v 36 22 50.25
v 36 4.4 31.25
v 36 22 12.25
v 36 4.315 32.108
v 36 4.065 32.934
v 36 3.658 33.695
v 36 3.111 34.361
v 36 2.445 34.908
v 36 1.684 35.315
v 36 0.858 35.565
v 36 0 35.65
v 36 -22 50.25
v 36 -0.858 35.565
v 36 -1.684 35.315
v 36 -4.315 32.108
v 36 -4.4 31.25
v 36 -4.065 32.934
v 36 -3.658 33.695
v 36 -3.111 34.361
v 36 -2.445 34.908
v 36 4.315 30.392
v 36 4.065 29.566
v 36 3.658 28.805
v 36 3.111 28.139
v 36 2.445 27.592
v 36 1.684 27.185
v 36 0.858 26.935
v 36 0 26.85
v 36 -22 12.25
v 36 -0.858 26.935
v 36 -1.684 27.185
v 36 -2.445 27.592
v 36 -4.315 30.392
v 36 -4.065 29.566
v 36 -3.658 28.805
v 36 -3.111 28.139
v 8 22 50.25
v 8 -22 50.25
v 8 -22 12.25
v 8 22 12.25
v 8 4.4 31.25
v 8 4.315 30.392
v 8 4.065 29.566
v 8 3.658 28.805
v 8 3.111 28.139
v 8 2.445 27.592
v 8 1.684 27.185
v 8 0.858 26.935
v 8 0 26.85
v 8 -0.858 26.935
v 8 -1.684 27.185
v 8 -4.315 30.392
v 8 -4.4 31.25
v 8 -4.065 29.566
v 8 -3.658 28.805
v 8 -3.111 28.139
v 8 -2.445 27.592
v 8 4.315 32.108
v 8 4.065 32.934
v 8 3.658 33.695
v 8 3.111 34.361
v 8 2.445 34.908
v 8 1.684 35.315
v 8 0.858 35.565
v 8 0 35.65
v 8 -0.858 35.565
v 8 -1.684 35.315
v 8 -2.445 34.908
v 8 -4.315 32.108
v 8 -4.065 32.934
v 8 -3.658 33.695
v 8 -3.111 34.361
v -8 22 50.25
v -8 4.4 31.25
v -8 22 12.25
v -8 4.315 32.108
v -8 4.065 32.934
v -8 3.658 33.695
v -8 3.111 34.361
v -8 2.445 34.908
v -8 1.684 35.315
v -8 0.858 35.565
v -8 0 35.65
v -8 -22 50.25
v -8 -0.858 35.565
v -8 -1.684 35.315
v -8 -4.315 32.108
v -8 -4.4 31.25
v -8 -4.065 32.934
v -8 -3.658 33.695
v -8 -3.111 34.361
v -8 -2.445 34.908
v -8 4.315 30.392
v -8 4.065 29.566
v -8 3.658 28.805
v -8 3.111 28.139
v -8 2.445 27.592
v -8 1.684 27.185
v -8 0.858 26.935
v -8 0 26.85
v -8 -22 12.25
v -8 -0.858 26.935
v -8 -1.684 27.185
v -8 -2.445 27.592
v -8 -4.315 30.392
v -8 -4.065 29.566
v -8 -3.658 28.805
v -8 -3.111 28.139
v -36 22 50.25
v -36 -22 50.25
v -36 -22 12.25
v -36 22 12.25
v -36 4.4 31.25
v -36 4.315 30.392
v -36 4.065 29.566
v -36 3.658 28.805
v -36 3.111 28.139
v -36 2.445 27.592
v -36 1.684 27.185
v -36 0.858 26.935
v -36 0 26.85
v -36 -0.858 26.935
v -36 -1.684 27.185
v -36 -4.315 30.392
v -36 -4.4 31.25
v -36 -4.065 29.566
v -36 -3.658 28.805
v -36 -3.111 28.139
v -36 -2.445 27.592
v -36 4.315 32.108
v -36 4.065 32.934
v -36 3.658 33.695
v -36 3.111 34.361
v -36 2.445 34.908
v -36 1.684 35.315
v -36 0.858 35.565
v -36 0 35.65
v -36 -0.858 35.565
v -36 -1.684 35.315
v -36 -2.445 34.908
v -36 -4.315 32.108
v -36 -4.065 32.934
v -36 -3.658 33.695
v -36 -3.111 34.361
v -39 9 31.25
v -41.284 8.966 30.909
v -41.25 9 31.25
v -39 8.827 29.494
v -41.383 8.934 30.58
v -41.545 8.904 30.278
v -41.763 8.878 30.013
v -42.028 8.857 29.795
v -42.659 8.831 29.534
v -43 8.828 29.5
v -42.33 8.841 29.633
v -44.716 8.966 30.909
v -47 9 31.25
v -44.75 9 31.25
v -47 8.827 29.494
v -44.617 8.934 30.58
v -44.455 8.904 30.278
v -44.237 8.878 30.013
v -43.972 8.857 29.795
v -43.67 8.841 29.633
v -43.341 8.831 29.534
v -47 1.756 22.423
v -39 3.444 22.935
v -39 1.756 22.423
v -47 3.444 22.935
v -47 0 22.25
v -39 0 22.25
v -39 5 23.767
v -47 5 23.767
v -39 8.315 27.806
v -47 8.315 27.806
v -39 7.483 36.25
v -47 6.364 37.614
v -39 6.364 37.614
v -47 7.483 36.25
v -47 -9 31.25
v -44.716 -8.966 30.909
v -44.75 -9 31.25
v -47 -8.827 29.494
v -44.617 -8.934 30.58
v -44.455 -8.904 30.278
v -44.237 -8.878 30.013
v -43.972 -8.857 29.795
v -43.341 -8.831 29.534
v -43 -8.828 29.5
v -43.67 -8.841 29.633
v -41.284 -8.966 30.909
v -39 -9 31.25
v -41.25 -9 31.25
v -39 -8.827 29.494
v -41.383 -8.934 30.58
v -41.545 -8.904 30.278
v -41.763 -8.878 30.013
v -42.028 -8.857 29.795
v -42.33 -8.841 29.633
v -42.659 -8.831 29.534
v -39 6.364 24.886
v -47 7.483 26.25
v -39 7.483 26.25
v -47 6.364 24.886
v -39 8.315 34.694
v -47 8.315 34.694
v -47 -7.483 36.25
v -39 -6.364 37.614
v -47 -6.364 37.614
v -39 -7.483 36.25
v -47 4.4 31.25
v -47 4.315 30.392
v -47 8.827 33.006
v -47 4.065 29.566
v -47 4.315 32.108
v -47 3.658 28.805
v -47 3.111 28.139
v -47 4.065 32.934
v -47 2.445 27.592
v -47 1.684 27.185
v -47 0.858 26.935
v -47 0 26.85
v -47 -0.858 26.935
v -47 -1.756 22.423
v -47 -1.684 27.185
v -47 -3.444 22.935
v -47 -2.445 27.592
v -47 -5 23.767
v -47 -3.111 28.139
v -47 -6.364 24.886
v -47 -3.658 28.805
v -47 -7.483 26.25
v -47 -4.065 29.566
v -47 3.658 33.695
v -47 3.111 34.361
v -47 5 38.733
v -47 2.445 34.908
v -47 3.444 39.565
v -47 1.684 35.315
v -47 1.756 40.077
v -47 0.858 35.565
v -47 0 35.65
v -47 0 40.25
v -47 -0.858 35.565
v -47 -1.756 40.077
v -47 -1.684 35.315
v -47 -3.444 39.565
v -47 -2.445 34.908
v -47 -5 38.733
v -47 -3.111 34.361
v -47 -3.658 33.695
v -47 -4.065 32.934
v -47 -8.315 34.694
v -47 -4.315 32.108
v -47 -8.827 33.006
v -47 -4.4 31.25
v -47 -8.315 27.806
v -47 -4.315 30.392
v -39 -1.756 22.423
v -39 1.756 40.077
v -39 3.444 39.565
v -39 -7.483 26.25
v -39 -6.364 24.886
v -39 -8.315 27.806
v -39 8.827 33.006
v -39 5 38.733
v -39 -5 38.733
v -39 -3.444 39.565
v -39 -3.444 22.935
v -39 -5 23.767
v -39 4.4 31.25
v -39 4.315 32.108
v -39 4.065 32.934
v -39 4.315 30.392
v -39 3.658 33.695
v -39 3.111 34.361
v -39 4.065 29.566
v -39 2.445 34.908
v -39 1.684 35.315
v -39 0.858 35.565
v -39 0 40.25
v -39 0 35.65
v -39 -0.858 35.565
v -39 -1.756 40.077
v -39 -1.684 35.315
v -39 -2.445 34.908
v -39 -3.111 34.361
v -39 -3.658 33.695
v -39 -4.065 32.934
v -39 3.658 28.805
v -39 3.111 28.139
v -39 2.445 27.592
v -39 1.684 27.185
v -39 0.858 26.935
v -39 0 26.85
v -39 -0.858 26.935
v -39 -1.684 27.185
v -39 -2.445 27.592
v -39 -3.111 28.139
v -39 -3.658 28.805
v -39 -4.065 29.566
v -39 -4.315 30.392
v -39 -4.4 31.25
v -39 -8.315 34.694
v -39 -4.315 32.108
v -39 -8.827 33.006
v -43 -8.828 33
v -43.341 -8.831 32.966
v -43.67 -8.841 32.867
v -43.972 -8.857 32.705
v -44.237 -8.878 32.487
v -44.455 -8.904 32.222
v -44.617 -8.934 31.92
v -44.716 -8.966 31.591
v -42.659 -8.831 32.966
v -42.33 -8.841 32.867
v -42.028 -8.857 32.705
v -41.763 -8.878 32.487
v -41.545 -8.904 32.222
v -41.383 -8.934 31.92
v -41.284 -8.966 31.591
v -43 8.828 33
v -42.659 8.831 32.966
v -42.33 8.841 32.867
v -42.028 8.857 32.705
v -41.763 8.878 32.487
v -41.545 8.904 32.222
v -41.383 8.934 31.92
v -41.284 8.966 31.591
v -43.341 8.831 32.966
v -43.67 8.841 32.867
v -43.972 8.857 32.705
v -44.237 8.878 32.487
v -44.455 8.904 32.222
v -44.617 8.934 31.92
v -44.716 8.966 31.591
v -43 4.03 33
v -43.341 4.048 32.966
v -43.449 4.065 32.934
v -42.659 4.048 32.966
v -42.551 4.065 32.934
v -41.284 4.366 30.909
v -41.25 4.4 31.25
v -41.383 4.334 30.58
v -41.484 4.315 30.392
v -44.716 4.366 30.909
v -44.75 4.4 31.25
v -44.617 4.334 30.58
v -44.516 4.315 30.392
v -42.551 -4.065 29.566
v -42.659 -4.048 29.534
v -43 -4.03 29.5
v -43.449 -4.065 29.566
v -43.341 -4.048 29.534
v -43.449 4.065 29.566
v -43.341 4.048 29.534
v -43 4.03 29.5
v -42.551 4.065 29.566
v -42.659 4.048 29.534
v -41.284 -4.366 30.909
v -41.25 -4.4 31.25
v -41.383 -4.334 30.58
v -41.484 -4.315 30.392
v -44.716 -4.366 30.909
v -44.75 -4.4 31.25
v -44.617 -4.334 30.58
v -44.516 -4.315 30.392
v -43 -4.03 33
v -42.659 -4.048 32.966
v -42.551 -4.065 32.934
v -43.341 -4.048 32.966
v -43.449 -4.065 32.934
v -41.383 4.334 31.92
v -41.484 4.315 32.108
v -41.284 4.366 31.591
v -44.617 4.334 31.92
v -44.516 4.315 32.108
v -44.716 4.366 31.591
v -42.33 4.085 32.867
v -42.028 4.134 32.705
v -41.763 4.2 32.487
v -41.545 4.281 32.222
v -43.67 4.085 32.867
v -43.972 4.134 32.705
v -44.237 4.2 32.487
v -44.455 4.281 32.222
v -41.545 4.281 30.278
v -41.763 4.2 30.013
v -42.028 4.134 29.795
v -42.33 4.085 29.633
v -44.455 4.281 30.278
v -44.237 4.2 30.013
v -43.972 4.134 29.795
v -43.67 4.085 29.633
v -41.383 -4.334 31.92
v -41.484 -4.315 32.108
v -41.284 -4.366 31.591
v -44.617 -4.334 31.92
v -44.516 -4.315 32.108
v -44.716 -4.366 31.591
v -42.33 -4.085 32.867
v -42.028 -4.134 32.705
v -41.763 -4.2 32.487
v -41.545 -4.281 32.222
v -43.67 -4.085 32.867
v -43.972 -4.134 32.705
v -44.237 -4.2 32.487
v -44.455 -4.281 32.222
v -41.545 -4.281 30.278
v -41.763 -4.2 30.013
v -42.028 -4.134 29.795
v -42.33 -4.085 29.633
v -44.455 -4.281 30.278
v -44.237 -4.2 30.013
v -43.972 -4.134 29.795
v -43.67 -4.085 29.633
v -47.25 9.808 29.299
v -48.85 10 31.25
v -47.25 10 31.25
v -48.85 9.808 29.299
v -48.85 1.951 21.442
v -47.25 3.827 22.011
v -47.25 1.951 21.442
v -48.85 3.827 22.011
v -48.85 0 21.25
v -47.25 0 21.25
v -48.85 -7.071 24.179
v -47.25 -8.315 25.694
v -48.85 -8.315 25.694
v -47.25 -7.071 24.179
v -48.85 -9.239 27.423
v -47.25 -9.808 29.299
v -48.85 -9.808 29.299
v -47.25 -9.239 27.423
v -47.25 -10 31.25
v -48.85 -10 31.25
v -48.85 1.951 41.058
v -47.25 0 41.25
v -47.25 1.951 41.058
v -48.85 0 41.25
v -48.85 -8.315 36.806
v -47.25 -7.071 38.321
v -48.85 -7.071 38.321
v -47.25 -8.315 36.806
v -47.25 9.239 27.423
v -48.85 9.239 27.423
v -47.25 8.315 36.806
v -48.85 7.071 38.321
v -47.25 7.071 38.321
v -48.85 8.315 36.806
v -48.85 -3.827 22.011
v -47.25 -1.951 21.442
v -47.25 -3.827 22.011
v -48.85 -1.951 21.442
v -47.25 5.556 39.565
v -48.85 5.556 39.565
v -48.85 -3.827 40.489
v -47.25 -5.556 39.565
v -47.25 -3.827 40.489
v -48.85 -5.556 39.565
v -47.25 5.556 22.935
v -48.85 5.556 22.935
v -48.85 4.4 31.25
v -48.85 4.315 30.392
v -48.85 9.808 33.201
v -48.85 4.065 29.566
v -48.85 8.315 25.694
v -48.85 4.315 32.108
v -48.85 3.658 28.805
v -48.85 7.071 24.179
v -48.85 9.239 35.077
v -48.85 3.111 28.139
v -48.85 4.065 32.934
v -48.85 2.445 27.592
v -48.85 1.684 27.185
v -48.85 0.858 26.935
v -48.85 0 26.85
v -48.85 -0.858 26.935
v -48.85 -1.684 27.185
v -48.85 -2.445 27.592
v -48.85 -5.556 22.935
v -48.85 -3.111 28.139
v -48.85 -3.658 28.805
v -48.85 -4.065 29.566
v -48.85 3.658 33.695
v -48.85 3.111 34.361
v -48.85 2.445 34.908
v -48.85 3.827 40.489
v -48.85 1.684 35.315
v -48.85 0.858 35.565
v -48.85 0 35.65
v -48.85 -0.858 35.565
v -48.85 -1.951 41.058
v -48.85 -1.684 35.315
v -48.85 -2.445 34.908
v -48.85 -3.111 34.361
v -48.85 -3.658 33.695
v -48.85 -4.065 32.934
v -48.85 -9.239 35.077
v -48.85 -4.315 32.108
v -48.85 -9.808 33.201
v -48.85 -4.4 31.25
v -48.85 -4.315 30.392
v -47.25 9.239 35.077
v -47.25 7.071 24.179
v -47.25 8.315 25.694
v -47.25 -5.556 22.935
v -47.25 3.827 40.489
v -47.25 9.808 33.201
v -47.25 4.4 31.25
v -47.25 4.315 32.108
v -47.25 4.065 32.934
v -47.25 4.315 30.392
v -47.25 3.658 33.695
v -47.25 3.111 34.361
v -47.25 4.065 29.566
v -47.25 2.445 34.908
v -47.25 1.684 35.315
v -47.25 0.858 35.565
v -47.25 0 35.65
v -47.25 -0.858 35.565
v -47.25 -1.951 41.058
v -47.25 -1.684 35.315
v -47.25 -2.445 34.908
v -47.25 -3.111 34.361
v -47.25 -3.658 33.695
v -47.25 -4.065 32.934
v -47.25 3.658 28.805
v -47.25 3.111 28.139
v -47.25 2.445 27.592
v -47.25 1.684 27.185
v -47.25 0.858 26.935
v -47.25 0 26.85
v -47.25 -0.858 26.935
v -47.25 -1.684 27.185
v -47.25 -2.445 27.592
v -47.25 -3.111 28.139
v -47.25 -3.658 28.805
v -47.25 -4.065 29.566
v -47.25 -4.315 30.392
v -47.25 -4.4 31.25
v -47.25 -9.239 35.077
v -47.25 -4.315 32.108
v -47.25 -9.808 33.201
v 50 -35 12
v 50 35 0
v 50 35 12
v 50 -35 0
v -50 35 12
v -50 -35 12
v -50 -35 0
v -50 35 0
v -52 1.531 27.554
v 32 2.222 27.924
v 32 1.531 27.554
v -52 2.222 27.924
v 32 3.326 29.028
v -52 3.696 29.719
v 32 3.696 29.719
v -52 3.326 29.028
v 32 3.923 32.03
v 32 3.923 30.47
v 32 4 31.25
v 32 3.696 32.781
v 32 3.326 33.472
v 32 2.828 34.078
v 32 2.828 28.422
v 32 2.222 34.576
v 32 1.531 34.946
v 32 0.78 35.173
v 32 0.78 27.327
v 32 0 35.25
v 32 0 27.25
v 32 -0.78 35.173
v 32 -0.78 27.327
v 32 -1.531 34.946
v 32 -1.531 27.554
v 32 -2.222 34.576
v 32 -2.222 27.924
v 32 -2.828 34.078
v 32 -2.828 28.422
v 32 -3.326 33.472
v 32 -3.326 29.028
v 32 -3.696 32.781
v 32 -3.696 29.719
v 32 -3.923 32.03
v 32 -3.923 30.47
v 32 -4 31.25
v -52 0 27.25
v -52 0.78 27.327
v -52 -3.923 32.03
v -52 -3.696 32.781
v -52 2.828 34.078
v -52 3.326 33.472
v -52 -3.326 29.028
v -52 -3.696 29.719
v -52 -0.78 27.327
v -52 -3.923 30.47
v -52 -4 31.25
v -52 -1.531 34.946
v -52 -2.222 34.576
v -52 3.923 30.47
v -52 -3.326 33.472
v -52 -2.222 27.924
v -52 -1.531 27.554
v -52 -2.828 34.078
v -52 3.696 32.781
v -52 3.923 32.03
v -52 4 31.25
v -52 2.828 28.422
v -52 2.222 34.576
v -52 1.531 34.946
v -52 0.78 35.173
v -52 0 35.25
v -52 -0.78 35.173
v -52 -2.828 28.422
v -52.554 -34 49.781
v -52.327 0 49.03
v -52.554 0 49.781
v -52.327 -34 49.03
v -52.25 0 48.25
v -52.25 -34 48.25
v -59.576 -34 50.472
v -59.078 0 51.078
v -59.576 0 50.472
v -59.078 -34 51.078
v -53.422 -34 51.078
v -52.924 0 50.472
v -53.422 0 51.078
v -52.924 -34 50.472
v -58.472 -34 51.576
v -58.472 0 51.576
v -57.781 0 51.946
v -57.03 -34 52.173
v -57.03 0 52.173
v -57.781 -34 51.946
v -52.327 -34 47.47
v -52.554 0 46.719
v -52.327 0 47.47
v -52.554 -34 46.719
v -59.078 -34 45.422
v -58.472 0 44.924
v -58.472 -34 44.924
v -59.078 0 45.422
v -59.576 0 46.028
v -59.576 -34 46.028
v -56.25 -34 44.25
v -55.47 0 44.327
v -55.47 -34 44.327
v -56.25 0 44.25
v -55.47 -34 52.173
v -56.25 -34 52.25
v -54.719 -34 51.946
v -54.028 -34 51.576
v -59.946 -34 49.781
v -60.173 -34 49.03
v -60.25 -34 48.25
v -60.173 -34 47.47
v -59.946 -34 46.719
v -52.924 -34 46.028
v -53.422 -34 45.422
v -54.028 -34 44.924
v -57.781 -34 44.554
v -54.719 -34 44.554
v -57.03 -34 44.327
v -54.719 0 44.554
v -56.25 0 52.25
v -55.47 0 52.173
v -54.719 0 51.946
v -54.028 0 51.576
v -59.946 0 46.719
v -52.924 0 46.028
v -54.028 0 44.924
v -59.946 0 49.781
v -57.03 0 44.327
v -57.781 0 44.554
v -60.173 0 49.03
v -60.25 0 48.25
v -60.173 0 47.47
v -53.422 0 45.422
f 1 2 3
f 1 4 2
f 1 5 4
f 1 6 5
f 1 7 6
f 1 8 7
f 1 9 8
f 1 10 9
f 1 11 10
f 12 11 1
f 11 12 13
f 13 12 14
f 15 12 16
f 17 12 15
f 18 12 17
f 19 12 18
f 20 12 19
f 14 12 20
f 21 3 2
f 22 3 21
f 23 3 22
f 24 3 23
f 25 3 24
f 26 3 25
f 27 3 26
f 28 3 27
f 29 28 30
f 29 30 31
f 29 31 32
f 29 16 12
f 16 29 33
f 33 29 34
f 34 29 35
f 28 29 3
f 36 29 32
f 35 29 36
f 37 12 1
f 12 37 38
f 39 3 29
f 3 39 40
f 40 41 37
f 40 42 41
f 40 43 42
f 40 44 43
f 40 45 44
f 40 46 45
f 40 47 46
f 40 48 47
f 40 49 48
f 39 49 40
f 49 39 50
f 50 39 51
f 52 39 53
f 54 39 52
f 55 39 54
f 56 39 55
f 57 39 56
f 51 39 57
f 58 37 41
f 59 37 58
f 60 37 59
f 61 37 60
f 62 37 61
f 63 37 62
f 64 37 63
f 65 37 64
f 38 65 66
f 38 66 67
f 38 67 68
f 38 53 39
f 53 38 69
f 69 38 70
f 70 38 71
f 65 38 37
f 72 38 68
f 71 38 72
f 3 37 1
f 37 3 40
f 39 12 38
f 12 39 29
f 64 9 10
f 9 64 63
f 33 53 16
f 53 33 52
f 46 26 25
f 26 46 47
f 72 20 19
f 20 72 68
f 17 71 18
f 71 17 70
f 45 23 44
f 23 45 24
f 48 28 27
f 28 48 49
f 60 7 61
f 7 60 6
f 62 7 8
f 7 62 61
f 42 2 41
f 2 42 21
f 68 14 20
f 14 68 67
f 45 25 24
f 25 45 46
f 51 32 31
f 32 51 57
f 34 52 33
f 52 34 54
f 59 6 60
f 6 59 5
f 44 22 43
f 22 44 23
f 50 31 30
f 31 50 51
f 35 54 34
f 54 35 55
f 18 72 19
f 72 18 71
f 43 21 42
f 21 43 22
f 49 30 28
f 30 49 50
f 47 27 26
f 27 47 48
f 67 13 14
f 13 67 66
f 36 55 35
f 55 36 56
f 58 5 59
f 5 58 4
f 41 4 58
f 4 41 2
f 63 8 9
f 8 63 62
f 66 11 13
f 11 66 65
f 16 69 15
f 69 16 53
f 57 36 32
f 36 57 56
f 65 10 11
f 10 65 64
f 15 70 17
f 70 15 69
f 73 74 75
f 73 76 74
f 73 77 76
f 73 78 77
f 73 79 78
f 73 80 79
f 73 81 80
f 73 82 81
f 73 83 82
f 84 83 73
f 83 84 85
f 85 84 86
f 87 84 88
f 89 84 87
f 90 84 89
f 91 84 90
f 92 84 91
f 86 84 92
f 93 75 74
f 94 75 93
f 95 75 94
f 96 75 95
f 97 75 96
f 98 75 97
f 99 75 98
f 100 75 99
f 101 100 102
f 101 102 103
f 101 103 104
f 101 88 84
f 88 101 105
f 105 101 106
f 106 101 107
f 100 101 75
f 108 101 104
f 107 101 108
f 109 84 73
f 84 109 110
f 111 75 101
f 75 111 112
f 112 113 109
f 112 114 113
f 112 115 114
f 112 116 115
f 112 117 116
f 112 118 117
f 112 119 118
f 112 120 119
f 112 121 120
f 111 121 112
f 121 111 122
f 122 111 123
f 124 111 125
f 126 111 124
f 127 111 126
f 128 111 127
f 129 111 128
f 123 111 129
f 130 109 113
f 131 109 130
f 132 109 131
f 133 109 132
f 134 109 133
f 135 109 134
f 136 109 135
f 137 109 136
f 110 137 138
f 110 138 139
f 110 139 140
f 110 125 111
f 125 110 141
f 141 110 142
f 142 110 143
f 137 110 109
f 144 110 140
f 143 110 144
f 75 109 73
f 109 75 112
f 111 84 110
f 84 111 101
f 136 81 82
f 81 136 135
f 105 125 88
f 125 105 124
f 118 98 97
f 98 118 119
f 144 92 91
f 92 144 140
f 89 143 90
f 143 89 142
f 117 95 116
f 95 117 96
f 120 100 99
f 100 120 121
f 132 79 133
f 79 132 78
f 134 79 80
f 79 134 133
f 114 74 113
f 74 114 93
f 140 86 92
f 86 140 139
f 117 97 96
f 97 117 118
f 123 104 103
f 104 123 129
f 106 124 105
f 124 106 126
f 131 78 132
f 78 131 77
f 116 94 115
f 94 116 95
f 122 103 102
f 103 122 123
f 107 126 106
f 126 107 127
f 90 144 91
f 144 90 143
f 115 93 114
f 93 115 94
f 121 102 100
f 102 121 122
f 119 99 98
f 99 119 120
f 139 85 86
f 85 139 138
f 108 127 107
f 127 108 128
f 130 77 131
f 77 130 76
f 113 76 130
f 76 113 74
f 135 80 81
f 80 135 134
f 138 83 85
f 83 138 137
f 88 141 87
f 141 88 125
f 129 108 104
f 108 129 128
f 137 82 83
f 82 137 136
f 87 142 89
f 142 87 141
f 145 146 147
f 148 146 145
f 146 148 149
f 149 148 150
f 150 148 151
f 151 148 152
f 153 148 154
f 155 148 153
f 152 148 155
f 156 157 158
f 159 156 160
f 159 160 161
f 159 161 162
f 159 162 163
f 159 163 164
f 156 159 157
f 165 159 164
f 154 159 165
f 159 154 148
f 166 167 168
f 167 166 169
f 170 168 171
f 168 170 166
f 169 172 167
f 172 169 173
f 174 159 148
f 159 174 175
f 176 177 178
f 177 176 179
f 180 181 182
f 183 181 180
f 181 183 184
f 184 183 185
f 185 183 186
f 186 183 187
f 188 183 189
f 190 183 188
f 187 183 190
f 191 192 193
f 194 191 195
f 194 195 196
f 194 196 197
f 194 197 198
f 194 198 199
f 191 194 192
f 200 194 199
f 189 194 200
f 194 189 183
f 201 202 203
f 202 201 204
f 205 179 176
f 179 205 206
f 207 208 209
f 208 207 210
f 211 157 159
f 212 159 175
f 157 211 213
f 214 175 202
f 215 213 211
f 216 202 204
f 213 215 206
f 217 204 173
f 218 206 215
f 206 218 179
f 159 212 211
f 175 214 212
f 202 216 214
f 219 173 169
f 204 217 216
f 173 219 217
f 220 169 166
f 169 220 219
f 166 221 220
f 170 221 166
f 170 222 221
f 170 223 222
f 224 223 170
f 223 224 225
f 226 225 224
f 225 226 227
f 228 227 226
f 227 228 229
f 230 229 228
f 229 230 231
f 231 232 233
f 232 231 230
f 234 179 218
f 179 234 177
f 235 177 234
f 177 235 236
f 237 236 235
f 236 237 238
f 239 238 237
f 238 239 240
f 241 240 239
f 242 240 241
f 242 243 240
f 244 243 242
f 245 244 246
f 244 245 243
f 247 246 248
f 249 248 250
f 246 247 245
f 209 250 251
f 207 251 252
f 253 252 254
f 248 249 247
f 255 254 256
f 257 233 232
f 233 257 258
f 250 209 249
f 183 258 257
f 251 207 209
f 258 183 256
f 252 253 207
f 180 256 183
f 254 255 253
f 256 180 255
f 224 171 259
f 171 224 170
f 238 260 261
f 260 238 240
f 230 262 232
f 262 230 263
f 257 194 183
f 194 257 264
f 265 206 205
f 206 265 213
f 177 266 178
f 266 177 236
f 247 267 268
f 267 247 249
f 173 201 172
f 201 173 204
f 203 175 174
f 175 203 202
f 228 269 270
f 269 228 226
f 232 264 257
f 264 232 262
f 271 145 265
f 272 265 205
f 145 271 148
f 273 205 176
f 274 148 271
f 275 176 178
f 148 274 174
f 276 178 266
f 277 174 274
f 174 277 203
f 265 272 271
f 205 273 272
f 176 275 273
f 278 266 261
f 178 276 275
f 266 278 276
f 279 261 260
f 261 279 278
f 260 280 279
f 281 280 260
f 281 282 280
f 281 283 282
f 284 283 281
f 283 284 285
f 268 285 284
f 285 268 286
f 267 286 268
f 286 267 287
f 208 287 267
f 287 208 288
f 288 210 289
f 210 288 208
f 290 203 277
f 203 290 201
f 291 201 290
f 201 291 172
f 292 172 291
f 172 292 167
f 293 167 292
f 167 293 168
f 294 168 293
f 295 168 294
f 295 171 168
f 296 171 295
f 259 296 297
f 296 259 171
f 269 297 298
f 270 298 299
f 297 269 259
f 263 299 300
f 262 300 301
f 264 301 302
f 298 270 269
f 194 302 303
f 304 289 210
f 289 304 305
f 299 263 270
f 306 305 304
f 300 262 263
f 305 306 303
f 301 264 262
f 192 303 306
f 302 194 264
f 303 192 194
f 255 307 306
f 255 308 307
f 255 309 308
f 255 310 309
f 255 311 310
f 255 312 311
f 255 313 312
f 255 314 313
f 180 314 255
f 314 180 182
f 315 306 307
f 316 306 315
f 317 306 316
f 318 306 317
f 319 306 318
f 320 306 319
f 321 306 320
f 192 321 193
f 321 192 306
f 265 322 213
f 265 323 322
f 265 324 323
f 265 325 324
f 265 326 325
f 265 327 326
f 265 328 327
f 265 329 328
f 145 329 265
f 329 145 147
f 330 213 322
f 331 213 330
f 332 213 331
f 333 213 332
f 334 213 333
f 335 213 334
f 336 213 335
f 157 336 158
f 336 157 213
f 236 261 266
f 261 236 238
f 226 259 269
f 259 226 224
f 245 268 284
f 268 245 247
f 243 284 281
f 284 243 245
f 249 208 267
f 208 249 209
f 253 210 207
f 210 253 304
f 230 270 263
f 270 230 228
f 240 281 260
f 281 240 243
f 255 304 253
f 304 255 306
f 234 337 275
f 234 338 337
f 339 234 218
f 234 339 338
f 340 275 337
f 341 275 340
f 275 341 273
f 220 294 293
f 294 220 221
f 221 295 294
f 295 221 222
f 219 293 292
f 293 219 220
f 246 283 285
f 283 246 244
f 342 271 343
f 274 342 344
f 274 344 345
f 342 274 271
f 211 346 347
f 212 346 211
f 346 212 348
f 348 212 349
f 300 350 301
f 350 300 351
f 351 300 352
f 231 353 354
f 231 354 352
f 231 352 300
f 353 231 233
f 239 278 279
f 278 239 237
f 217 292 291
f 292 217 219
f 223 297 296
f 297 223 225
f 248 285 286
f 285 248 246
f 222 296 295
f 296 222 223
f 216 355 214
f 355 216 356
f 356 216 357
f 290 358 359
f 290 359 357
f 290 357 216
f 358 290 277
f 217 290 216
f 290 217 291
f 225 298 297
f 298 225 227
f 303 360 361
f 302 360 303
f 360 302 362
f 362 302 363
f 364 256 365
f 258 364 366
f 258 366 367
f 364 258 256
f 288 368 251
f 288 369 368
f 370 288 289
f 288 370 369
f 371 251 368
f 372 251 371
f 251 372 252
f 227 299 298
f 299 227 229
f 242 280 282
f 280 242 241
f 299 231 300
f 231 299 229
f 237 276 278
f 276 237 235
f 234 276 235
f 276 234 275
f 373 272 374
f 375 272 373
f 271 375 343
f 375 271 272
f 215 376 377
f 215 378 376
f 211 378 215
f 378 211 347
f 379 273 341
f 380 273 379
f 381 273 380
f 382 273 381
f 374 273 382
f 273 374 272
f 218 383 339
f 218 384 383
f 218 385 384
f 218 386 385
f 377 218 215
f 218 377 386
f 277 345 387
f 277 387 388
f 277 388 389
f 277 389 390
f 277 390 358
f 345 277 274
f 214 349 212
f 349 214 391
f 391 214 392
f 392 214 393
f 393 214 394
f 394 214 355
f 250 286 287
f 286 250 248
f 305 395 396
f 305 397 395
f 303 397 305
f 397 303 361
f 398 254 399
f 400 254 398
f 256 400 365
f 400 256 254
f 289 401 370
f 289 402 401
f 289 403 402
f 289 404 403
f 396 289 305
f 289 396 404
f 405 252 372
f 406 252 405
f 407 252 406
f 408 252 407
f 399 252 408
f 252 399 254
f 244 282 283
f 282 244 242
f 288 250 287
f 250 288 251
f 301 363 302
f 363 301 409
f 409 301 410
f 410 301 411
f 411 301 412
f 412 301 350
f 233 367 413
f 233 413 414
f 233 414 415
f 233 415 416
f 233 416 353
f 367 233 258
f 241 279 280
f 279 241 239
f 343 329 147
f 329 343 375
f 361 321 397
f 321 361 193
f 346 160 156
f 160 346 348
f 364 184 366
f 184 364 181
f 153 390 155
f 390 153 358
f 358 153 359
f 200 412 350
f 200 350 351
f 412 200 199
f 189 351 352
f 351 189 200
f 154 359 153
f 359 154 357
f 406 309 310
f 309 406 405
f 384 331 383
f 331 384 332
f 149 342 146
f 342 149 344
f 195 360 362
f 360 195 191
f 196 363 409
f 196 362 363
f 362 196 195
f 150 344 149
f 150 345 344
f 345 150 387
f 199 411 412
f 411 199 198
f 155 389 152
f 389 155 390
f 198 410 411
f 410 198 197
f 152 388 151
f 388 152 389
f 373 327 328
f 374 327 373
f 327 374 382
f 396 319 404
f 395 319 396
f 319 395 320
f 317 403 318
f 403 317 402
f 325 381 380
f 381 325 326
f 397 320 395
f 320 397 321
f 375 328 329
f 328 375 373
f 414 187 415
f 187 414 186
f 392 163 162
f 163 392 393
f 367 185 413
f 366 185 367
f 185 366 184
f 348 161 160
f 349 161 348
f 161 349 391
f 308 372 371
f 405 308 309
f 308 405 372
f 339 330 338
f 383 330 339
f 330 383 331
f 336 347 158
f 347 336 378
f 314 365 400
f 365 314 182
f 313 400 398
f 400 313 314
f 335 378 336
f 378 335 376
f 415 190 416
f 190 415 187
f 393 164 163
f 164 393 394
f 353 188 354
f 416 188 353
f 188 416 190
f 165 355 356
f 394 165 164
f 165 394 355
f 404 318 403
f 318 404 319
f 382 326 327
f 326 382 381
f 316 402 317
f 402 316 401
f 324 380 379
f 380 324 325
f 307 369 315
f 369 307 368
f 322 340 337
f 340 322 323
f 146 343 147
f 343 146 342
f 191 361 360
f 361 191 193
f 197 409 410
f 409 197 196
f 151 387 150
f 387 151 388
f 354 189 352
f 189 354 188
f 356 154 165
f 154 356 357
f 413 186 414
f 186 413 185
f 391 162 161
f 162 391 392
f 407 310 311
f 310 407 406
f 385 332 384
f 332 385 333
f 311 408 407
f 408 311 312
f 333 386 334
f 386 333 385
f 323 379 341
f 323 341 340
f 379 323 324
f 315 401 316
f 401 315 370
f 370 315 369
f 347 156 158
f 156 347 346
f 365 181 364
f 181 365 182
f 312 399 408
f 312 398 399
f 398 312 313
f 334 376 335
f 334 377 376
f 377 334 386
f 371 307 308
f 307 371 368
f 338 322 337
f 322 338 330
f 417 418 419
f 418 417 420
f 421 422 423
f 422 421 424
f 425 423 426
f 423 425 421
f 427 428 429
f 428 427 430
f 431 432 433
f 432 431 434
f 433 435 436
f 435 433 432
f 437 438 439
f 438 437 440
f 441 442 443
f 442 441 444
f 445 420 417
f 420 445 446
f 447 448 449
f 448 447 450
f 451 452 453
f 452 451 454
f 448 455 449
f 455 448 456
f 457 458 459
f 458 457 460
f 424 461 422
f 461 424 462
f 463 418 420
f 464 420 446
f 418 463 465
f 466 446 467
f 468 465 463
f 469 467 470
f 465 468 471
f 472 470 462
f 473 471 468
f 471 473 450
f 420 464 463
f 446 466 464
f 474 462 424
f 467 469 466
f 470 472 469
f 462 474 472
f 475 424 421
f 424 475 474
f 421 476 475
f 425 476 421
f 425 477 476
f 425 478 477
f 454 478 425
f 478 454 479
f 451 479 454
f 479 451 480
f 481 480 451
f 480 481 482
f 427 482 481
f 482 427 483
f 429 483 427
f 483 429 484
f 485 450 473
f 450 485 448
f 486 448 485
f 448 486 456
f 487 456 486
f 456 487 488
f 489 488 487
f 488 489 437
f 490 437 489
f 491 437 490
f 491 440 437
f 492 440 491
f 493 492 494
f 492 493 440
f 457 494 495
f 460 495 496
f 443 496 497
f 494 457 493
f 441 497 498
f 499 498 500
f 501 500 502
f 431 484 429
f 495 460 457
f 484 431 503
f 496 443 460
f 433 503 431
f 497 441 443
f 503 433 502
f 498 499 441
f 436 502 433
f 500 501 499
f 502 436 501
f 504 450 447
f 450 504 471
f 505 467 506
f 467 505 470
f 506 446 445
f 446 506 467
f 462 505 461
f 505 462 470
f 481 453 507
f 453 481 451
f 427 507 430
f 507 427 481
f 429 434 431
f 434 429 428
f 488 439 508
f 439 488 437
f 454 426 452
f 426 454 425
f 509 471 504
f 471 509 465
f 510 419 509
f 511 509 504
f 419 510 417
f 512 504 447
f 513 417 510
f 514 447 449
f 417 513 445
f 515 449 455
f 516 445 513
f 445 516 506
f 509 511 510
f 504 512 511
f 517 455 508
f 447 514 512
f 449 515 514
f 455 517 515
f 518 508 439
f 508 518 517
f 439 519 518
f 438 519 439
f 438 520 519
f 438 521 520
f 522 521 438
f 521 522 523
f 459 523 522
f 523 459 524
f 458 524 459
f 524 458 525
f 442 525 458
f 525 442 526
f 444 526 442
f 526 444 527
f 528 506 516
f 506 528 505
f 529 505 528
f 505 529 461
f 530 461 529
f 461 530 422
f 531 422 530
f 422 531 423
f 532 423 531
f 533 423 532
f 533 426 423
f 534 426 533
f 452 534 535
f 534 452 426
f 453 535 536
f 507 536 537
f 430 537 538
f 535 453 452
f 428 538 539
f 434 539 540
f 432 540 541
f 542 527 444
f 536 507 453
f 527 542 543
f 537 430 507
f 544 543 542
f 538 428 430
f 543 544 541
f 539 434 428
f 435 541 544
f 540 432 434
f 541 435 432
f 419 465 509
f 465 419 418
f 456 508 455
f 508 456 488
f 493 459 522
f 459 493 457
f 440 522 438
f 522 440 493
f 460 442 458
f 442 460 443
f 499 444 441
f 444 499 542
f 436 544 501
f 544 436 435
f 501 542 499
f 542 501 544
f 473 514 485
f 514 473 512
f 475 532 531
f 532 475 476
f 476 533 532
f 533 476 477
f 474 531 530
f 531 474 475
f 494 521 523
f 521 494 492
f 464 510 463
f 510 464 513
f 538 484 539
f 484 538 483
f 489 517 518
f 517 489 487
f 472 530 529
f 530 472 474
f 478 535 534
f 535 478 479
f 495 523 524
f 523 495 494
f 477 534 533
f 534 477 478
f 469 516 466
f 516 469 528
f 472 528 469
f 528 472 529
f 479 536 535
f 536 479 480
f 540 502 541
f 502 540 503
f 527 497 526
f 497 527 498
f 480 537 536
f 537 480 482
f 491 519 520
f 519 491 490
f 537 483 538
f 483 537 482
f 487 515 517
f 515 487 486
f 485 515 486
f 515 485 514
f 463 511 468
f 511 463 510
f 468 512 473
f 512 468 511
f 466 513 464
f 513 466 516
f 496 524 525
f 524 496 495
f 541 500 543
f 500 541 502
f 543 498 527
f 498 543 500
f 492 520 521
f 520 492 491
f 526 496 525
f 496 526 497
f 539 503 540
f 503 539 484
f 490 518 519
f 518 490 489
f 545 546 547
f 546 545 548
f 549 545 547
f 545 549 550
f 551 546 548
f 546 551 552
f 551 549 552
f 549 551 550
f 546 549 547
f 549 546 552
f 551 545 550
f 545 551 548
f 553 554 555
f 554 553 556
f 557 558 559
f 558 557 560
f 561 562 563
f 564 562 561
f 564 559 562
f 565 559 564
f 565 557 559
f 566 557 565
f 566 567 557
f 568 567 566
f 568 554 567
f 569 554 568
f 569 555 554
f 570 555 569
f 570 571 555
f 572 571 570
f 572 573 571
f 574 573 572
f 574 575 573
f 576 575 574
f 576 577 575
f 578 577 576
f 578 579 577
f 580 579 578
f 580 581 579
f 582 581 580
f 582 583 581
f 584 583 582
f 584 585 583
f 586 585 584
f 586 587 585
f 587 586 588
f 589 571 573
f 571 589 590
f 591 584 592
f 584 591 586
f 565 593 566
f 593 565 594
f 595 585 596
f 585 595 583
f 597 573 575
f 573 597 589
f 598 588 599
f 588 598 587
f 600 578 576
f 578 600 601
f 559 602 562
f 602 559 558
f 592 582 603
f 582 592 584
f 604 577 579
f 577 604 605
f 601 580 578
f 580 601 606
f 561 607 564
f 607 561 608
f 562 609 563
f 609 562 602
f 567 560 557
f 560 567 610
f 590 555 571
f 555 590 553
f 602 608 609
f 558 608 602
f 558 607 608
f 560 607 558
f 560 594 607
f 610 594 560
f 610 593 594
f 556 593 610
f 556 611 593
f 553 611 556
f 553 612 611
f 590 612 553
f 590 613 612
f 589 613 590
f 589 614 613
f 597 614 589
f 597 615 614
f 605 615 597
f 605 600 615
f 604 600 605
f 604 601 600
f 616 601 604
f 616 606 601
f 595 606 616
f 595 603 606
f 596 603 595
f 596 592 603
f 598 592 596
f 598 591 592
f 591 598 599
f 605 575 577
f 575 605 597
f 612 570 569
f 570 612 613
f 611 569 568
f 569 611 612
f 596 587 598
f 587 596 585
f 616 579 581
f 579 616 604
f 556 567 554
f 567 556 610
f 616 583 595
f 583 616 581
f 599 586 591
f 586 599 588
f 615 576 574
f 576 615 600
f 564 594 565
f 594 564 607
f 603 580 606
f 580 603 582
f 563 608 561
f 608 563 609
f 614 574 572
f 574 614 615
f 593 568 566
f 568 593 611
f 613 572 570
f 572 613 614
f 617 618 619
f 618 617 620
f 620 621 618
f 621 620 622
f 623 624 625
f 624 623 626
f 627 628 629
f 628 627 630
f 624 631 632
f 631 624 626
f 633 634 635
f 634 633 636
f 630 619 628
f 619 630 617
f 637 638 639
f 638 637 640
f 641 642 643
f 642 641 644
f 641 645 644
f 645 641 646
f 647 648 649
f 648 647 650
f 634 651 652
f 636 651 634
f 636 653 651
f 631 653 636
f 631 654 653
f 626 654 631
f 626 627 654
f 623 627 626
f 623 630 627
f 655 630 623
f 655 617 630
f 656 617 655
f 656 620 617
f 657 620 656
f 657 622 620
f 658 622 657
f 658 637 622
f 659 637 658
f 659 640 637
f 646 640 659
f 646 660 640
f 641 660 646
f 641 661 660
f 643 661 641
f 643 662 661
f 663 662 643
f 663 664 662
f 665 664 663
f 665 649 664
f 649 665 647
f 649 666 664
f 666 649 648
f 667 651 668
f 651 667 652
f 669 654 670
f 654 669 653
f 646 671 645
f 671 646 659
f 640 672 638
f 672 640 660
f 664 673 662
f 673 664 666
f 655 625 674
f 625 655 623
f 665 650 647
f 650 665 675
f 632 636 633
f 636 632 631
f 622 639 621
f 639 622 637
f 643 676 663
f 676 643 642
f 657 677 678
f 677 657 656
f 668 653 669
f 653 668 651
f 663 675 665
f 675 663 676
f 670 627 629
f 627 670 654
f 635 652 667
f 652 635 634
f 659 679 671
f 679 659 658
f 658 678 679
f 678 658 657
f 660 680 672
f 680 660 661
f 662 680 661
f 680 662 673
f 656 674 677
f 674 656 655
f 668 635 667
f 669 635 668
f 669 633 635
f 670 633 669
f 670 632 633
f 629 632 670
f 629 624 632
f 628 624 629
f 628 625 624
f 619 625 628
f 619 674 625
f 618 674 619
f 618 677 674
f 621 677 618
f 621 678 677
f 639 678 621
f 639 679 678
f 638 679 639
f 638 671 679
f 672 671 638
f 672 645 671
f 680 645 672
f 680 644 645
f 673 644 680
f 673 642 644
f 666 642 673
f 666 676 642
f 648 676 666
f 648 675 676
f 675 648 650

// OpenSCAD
$fn = 32;

// ------------------------------------------------------------------------
// Machine vise: screw d8, jaws 28 x 38 mm
// Every part is its own module, assembly() places every instance.
// ------------------------------------------------------------------------

// --- part 1 ---
module vise_bed() {
  difference() {
    translate([-50, -35, 0]) cube([100, 70, 12]);
  }
}

// --- part 2 ---
module vise_jaw() {
  difference() {
    translate([-14, -22, 0]) cube([28, 44, 38]);
    translate([0, 0, 19]) rotate([0, 90, 0]) cylinder(h = 30, d = 8.8, center = true);
  }
}

// --- part 3 ---
module vise_screw() {
  translate([0, 0, -42]) cylinder(h = 84, d = 8);
}

// --- part 4 ---
module screw_collar() {
  difference() {
    cylinder(h = 8, d = 18);
    translate([0, 0, -1]) cylinder(h = 10, d = 8.8);
    translate([0, 0, 4]) rotate([90, 0, 0]) cylinder(h = 20, d = 3.5, center = true);
  }
}

// --- part 5 ---
module screw_washer() {
  difference() {
      translate([0, 0, 0]) cylinder(h = 1.6, d = 20);
      translate([0, 0, -1]) cylinder(h = 3.6, d = 8.8);
    }
}

// --- part 6 ---
module vise_handle() {
  cylinder(h = 34, d = 8);
}

// --- assembly ---
module assembly() {
  color([0.80, 0.24, 0.20]) translate([0, 0, 0]) rotate([0, 0, 0]) vise_bed();
  color([0.20, 0.45, 0.75]) translate([22, 0, 12.25]) rotate([0, 0, 0]) vise_jaw();
  color([0.25, 0.62, 0.32]) translate([-22, 0, 12.25]) rotate([0, 0, 0]) vise_jaw();
  color([0.92, 0.70, 0.18]) translate([-10, 0, 31.25]) rotate([0, 90, 0]) vise_screw();
  color([0.58, 0.35, 0.70]) translate([-47, 0, 31.25]) rotate([0, 90, 0]) screw_collar();
  color([0.16, 0.66, 0.66]) translate([-48.85, 0, 31.25]) rotate([0, 90, 0]) screw_washer();
  color([0.85, 0.48, 0.18]) translate([-56.25, 0, 48.25]) rotate([90, 0, 0]) vise_handle();
}

assembly();
